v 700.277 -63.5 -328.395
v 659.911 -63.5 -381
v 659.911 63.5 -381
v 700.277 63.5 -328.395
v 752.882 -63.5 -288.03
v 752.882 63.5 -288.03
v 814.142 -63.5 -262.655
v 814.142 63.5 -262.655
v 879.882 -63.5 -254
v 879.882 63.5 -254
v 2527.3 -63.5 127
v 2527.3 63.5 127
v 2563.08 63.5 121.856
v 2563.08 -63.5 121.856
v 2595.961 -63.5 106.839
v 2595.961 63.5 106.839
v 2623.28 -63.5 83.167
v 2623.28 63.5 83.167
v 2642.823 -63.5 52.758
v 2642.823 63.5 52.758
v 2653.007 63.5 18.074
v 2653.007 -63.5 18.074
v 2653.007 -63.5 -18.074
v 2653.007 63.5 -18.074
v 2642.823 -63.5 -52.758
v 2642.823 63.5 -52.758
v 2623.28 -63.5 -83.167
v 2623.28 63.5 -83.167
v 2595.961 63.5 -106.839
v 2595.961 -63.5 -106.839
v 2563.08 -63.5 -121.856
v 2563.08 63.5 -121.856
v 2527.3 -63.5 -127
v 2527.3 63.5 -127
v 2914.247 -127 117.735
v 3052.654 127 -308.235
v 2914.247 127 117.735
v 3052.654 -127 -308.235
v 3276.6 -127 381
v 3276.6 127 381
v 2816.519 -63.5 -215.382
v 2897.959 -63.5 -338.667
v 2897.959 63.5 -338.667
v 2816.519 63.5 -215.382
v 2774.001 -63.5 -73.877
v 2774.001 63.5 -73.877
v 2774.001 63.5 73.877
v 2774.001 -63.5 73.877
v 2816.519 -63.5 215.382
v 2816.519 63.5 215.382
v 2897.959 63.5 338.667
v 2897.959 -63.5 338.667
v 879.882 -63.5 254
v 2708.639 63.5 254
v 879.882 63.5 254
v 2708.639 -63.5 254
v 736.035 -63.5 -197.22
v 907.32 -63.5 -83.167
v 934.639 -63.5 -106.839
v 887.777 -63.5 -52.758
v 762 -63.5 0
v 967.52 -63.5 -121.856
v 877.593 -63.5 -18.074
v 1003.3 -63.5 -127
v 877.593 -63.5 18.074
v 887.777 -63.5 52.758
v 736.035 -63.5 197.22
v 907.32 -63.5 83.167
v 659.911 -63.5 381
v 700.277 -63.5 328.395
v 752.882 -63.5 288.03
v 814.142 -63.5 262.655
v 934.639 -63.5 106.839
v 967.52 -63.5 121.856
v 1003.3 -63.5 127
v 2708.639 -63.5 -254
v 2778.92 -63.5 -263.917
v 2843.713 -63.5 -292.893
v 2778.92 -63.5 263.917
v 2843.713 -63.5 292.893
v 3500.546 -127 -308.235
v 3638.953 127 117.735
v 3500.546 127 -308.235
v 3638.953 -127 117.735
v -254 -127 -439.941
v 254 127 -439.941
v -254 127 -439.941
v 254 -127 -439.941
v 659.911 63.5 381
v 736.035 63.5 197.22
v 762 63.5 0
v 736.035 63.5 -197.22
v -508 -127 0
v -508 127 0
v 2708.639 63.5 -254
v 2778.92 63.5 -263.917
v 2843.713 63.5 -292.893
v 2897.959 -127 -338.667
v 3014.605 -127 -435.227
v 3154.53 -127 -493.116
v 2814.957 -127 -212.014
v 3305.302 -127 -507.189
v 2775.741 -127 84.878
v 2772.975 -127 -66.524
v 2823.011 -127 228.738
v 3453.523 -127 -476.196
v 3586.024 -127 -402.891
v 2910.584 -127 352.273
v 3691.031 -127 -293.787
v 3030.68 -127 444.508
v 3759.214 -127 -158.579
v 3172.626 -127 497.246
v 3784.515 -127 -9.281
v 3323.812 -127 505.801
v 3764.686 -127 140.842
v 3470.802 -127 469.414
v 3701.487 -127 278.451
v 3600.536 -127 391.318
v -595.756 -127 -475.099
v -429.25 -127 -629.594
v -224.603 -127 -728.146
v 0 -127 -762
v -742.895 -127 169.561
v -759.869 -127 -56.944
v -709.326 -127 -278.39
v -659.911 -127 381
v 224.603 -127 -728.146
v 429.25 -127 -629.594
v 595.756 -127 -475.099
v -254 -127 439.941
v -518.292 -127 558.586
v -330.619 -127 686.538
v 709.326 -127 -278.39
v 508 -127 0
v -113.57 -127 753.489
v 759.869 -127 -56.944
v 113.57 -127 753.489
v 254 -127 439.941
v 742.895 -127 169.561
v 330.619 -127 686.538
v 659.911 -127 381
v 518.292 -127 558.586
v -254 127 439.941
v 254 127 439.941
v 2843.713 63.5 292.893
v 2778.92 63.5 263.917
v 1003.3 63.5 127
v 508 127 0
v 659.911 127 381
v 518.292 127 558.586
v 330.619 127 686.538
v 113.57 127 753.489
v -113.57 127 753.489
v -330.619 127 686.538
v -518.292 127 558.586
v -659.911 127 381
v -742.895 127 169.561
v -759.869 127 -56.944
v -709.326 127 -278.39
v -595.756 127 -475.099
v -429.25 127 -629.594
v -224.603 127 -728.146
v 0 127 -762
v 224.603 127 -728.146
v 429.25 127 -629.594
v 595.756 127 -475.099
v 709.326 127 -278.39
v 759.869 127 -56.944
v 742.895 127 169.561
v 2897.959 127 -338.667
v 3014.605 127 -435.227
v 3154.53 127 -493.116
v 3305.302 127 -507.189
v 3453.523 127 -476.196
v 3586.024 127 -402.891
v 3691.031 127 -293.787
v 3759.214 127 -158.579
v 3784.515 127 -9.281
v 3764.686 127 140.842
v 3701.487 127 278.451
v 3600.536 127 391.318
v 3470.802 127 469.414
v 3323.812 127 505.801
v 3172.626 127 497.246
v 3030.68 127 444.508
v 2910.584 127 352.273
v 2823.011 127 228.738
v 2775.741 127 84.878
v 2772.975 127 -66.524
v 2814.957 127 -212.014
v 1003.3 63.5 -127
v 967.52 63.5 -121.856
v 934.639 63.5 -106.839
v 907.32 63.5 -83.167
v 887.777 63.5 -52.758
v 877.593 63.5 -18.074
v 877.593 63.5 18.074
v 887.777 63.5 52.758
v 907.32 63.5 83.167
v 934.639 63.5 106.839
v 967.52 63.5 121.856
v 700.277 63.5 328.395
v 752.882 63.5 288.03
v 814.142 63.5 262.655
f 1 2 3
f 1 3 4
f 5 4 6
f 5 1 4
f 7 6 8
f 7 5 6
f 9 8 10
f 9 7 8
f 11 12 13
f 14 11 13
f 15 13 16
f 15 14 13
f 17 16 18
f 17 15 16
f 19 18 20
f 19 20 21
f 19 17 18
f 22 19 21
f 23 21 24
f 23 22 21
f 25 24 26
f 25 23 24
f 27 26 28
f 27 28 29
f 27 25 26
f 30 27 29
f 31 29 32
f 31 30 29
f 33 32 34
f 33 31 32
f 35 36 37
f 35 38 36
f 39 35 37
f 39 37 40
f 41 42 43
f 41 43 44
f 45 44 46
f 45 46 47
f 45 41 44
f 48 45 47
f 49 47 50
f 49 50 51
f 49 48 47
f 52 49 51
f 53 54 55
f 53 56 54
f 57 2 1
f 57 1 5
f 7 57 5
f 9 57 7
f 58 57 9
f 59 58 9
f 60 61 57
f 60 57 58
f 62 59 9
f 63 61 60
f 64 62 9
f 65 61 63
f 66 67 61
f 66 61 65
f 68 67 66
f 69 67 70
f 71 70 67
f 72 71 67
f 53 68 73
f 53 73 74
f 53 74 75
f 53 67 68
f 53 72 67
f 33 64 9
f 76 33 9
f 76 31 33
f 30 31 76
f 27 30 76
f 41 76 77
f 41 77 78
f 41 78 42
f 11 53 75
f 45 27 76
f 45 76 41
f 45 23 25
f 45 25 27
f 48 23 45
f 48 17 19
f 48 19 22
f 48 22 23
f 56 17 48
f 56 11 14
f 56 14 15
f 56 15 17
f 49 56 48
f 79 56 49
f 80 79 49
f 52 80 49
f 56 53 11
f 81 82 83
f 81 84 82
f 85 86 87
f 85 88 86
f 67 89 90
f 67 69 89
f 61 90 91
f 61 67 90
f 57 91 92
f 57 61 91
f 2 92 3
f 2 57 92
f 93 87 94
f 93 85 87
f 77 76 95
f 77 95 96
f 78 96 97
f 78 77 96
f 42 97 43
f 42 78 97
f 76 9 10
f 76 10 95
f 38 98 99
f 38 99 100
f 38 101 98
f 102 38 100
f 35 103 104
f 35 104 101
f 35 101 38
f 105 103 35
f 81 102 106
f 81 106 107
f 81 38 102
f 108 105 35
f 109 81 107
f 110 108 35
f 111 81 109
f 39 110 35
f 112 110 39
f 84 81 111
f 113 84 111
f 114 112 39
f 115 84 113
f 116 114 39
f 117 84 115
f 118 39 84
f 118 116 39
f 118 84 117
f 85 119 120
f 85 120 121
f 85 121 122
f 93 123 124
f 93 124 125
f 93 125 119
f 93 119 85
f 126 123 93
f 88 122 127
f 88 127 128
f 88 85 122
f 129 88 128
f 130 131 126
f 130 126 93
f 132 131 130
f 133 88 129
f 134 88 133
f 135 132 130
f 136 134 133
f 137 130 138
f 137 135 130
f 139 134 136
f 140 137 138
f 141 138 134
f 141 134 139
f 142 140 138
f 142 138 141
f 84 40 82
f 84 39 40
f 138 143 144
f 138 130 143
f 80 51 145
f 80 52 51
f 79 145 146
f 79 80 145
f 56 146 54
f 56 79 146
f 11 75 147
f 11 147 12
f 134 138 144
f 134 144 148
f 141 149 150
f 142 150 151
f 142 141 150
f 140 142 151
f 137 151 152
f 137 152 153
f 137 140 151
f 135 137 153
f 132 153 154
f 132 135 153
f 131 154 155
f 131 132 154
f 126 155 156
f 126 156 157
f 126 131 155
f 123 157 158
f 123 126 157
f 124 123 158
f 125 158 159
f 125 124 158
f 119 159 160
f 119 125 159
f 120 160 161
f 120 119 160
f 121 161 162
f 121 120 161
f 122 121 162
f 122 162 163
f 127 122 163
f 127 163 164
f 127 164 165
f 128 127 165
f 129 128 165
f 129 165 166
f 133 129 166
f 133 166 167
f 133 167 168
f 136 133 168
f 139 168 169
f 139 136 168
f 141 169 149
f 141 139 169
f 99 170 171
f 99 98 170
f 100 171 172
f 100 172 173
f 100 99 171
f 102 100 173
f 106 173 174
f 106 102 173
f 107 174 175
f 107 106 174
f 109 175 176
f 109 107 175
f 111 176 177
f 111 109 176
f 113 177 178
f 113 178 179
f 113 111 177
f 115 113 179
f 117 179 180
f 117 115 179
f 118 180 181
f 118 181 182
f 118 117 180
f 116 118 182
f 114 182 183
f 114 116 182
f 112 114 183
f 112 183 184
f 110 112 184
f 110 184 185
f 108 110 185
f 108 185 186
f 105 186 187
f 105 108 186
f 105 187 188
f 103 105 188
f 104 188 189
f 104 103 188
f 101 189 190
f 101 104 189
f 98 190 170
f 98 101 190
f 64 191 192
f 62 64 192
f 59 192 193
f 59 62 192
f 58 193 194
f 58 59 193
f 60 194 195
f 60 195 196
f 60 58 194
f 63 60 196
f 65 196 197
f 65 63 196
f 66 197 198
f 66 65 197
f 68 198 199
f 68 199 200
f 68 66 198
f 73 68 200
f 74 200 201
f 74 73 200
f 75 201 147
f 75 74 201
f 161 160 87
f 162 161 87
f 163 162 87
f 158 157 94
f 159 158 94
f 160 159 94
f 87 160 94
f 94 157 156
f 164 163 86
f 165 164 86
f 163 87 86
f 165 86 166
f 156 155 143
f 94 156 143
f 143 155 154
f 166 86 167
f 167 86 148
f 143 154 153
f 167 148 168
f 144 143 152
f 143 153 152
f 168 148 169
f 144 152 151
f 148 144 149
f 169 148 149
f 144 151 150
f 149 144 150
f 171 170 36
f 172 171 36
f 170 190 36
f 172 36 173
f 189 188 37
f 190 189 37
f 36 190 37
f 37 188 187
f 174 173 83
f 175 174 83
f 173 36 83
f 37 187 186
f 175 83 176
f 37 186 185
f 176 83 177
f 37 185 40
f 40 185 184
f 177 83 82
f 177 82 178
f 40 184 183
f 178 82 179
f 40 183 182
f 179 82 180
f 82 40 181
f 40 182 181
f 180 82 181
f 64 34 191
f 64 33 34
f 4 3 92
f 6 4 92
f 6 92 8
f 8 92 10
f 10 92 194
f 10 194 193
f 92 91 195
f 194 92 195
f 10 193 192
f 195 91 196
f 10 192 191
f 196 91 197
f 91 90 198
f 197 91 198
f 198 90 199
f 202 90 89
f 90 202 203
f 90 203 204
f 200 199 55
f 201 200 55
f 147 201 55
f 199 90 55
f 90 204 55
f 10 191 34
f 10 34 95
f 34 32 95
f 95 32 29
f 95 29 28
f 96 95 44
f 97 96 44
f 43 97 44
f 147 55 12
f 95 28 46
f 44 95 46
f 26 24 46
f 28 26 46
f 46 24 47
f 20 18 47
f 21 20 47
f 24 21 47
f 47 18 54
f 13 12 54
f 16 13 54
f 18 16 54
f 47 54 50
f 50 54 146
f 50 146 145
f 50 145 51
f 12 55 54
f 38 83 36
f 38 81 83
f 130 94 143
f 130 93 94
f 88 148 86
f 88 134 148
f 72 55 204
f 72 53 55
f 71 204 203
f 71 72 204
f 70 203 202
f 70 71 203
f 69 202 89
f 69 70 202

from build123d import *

# Parameters (mm, degrees)
F1_DEPTH = 127
F2_DEPTH = 63.5


with BuildPart() as f1:
    # F0 (on Front) → F1 (new body, symmetric)
    with BuildSketch(Plane.XZ):
        with BuildLine():
            ThreePointArc((3784.6, 0), (3457.8656216047, 474.5595583531), (2897.95915581, 338.6666666667))
            ThreePointArc((2897.95915581, 338.6666666667), (2768.6, 0), (2897.95915581, -338.6666666667))
            ThreePointArc((2897.95915581, -338.6666666667), (3457.8656216047, -474.5595583531), (3784.6, 0))
        make_face()
        Polygon((2914.2474672915, 117.7354748569), (3276.6, 381), (3638.9525327085, 117.7354748569), (3500.5461811234, -308.2354748569), (3052.6538188766, -308.2354748569), align=None, mode=Mode.SUBTRACT)
    extrude(amount=F1_DEPTH, both=True)


with BuildPart() as f1b:
    # F0 (on Front) → F1, piece 2 (new body, symmetric)
    with BuildSketch(Plane.XZ):
        with BuildLine():
            ThreePointArc((659.9113576837, -381), (736.0354796323, -197.2201123681), (762, 0))
            ThreePointArc((762, 0), (736.0354796323, 197.2201123681), (659.9113576837, 381))
            ThreePointArc((659.9113576837, 381), (-762, 0), (659.9113576837, -381))
        make_face()
        Polygon((254, 439.9409051225), (508, 0), (254, -439.9409051225), (-254, -439.9409051225), (-508, 0), (-254, 439.9409051225), align=None, mode=Mode.SUBTRACT)
    extrude(amount=F1_DEPTH, both=True)


with BuildPart() as f2:
    # F0 (on Front) → F2 (new body, symmetric)
    with BuildSketch(Plane.XZ):
        with BuildLine():
            ThreePointArc((659.9113576837, 381), (736.0354796323, 197.2201123681), (762, 0))
            ThreePointArc((762, 0), (736.0354796323, -197.2201123681), (659.9113576837, -381))
            ThreePointArc((659.9113576837, -381), (752.881810245, -288.0295474388), (879.881810245, -254))
            Line((879.881810245, -254), (1765.3, -254))
            Line((1765.3, -254), (2708.6387337151, -254))
            ThreePointArc((2708.6387337151, -254), (2812.3337994929, -276.1307839895), (2897.95915581, -338.6666666667))
            ThreePointArc((2897.95915581, -338.6666666667), (2768.6, 0), (2897.95915581, 338.6666666667))
            ThreePointArc((2897.95915581, 338.6666666667), (2812.3337994929, 276.1307839895), (2708.6387337151, 254))
            Line((2708.6387337151, 254), (1765.3, 254))
            Line((1765.3, 254), (879.881810245, 254))
            ThreePointArc((879.881810245, 254), (752.881810245, 288.0295474388), (659.9113576837, 381))
        make_face()
        with BuildLine():
            Line((1003.3, 127), (1765.3, 127))
            Line((1765.3, 127), (2527.3, 127))
            ThreePointArc((2527.3, 127), (2654.3, 0), (2527.3, -127))
            Line((2527.3, -127), (1003.3, -127))
            ThreePointArc((1003.3, -127), (876.3, 0), (1003.3, 127))
        make_face(mode=Mode.SUBTRACT)
    extrude(amount=F2_DEPTH, both=True)


solid = Compound([f1.part, f1b.part, f2.part])
